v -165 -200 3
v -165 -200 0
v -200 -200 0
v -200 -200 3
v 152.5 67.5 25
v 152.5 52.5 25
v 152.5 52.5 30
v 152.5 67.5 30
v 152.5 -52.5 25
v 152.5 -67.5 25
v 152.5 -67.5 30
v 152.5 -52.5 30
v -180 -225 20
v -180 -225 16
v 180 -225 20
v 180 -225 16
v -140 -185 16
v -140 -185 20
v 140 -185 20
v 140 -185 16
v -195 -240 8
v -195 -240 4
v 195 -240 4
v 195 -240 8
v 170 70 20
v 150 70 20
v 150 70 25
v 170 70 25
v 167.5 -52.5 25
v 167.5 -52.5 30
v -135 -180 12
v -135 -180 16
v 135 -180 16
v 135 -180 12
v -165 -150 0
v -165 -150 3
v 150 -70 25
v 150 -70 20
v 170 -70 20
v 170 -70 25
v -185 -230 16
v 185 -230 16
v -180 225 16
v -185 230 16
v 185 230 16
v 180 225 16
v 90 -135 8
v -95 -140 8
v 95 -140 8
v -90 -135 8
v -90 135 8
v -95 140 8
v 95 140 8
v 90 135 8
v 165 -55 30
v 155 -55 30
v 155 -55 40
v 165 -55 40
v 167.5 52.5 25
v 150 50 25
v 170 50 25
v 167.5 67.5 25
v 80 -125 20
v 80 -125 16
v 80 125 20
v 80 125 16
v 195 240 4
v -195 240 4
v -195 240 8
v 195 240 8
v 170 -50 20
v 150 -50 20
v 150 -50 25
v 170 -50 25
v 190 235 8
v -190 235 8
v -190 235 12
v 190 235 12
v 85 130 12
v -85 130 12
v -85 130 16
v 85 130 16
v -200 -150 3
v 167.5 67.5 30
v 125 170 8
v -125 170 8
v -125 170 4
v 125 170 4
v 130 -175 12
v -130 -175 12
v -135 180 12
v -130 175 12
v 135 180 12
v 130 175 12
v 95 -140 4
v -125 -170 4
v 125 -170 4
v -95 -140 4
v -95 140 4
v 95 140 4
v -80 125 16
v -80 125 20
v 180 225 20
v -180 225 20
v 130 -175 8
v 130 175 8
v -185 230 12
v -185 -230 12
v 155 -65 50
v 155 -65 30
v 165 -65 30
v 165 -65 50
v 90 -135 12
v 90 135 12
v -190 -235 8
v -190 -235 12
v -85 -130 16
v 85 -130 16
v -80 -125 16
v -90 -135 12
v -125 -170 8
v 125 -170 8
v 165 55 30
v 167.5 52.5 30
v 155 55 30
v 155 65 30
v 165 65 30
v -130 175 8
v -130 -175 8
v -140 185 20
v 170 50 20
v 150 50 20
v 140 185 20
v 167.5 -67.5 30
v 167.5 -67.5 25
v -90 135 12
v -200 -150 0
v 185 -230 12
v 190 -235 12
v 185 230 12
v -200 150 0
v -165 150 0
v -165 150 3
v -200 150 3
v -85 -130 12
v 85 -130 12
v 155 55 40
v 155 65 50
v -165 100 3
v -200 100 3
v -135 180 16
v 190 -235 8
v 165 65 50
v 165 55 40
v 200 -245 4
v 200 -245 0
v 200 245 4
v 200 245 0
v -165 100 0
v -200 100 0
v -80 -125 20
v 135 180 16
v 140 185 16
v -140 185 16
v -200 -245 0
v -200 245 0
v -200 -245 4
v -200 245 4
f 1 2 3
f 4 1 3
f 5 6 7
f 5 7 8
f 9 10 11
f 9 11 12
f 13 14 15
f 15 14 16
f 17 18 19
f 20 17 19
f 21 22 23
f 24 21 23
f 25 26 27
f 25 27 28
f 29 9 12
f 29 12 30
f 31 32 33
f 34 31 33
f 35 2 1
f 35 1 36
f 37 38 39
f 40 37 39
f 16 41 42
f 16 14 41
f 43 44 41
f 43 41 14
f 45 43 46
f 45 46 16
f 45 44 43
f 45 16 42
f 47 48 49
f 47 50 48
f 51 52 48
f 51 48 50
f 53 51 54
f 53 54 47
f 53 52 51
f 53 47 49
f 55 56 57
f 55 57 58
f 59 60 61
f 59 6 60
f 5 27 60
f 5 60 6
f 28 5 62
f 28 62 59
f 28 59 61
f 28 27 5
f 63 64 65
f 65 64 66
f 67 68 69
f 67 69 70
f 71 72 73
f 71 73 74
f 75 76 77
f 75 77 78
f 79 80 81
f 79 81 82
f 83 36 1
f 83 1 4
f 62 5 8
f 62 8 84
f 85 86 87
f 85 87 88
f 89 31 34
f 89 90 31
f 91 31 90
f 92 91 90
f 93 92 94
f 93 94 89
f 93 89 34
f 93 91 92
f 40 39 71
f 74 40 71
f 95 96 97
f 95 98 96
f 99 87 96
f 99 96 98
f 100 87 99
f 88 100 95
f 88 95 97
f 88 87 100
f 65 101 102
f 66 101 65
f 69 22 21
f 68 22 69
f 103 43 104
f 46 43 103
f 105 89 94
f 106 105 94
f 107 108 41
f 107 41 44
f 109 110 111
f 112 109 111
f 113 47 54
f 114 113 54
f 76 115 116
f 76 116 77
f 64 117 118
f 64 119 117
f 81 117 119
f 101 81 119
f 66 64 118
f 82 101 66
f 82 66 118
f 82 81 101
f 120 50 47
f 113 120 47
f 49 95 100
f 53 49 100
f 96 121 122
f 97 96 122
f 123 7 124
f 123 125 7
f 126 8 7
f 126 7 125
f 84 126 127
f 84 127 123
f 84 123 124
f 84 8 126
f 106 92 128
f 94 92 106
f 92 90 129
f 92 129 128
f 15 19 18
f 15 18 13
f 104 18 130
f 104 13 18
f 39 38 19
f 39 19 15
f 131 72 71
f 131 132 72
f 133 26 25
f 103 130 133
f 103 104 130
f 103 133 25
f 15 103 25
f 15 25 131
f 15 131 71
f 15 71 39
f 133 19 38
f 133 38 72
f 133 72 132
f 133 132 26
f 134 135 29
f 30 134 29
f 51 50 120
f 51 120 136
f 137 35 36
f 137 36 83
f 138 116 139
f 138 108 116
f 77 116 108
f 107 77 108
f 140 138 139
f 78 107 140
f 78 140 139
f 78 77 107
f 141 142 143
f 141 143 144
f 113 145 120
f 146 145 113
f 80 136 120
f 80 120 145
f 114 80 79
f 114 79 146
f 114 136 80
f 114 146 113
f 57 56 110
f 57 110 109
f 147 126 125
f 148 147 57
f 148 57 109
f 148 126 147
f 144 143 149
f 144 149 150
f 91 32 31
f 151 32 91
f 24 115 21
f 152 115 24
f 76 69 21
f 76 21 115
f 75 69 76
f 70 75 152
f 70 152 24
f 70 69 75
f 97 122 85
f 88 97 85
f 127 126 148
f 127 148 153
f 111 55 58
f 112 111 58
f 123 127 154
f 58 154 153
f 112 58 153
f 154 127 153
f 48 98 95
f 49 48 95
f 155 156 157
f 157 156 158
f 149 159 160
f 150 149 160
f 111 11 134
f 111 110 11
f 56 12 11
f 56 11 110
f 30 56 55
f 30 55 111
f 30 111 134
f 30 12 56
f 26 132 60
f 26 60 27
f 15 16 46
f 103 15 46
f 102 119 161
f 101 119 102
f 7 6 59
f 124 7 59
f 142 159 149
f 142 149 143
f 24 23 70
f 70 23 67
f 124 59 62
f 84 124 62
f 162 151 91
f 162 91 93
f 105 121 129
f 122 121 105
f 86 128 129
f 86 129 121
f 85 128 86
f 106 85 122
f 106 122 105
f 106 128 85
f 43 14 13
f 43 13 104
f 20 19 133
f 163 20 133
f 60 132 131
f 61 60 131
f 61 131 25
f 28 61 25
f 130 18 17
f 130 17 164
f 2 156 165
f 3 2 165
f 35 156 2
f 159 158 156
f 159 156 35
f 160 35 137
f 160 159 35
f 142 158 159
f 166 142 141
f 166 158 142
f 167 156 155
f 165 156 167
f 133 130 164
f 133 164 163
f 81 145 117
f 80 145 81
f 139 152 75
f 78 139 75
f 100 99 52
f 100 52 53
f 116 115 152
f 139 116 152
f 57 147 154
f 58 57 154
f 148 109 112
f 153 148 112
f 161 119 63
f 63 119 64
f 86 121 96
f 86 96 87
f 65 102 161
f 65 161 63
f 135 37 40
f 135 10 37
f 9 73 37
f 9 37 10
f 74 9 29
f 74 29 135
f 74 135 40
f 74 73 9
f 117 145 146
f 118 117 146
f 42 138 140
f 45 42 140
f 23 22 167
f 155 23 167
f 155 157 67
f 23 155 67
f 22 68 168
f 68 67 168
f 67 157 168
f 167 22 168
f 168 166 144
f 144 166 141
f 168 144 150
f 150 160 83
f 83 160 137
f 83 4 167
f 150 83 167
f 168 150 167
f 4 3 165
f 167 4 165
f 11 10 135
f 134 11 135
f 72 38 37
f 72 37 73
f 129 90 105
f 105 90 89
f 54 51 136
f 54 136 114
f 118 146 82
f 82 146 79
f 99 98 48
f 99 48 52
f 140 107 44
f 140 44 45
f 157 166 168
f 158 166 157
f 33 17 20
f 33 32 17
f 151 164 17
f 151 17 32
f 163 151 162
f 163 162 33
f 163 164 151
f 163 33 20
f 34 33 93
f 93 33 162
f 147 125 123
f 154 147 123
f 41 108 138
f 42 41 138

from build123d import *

# Parameters (mm, degrees)
BOSS_EXTRUDE2_DEPTH  = 4
SKETCH2_W            = 390
SKETCH2_H            = 480
BOSS_EXTRUDE3_DEPTH  = 4
SKETCH3_W            = 380
SKETCH3_H            = 470
BOSS_EXTRUDE4_DEPTH  = 4
SKETCH4_W            = 370
SKETCH4_H            = 460
BOSS_EXTRUDE5_DEPTH  = 4
SKETCH5_W            = 360
SKETCH5_H            = 450
BOSS_EXTRUDE6_DEPTH  = 4
SKETCH6_W            = 280
SKETCH6_H            = 370
CUT_EXTRUDE1_DEPTH   = 4
SKETCH7_W            = 270
SKETCH7_H            = 360
CUT_EXTRUDE2_DEPTH   = 4
SKETCH8_W            = 260
SKETCH8_H            = 350
CUT_EXTRUDE3_DEPTH   = 4
SKETCH9_W            = 250
SKETCH9_H            = 340
CUT_EXTRUDE4_DEPTH   = 4
SKETCH11_W           = 190
SKETCH11_H           = 280
BOSS_EXTRUDE7_DEPTH  = 4
SKETCH12_W           = 180
SKETCH12_H           = 270
BOSS_EXTRUDE8_DEPTH  = 4
SKETCH13_W           = 170
SKETCH13_H           = 260
BOSS_EXTRUDE9_DEPTH  = 4
SKETCH14_W           = 160
SKETCH14_H           = 250
BOSS_EXTRUDE10_DEPTH = 4
SKETCH15_W           = 20
SKETCH15_H           = 20
BOSS_EXTRUDE11_DEPTH = 5
SKETCH16_W           = 15
SKETCH16_H           = 15
BOSS_EXTRUDE12_DEPTH = 5
SKETCH17_W           = 10
SKETCH17_H           = 10
BOSS_EXTRUDE13_DEPTH = 20
BOSS_EXTRUDE14_REACH = 302
SKETCH18_W           = 10
SKETCH18_H           = 10
SKETCH19_W           = 35
SKETCH19_H           = 50
CUT_EXTRUDE5_DEPTH   = 3


with BuildPart() as part:
    # Sketch1 → Boss-Extrude2 (new body)
    with BuildSketch(Plane.XY):
        Polygon((200, 0), (200, -20), (200, -245), (-200, -245), (-200, -20), (-200, 0), (-200, 245), (200, 245), align=None)
    extrude(amount=BOSS_EXTRUDE2_DEPTH)

    # Sketch2 → Boss-Extrude3 (add)
    with BuildSketch(Plane.XY.offset(4)):
        Rectangle(SKETCH2_W, SKETCH2_H)
    extrude(amount=BOSS_EXTRUDE3_DEPTH)

    # Sketch3 → Boss-Extrude4 (add)
    with BuildSketch(Plane.XY.offset(8)):
        Rectangle(SKETCH3_W, SKETCH3_H)
    extrude(amount=BOSS_EXTRUDE4_DEPTH)

    # Sketch4 → Boss-Extrude5 (add)
    with BuildSketch(Plane.XY.offset(12)):
        Rectangle(SKETCH4_W, SKETCH4_H)
    extrude(amount=BOSS_EXTRUDE5_DEPTH)

    # Sketch5 → Boss-Extrude6 (add)
    with BuildSketch(Plane.XY.offset(16)):
        Rectangle(SKETCH5_W, SKETCH5_H)
    extrude(amount=BOSS_EXTRUDE6_DEPTH)

    # Sketch6 → Cut-Extrude1 (cut)
    with BuildSketch(Plane.XY.offset(20)):
        Rectangle(SKETCH6_W, SKETCH6_H)
    extrude(amount=-CUT_EXTRUDE1_DEPTH, mode=Mode.SUBTRACT)

    # Sketch7 → Cut-Extrude2 (cut)
    with BuildSketch(Plane.XY.offset(16)):
        Rectangle(SKETCH7_W, SKETCH7_H)
    extrude(amount=-CUT_EXTRUDE2_DEPTH, mode=Mode.SUBTRACT)

    # Sketch8 → Cut-Extrude3 (cut)
    with BuildSketch(Plane.XY.offset(12)):
        Rectangle(SKETCH8_W, SKETCH8_H)
    extrude(amount=-CUT_EXTRUDE3_DEPTH, mode=Mode.SUBTRACT)

    # Sketch9 → Cut-Extrude4 (cut)
    with BuildSketch(Plane.XY.offset(8)):
        Rectangle(SKETCH9_W, SKETCH9_H)
    extrude(amount=-CUT_EXTRUDE4_DEPTH, mode=Mode.SUBTRACT)

    # Sketch11 → Boss-Extrude7 (add)
    with BuildSketch(Plane.XY.offset(4)):
        Rectangle(SKETCH11_W, SKETCH11_H)
    extrude(amount=BOSS_EXTRUDE7_DEPTH)

    # Sketch12 → Boss-Extrude8 (add)
    with BuildSketch(Plane.XY.offset(8)):
        Rectangle(SKETCH12_W, SKETCH12_H)
    extrude(amount=BOSS_EXTRUDE8_DEPTH)

    # Sketch13 → Boss-Extrude9 (add)
    with BuildSketch(Plane.XY.offset(12)):
        Rectangle(SKETCH13_W, SKETCH13_H)
    extrude(amount=BOSS_EXTRUDE9_DEPTH)

    # Sketch14 → Boss-Extrude10 (add)
    with BuildSketch(Plane.XY.offset(16)):
        Rectangle(SKETCH14_W, SKETCH14_H)
    extrude(amount=BOSS_EXTRUDE10_DEPTH)

    # Sketch15 → Boss-Extrude11 (add)
    with BuildSketch(Plane.XY.offset(20)):
        with Locations((160, 60)):
            Rectangle(SKETCH15_W, SKETCH15_H)
        with Locations((160, -60)):
            Rectangle(SKETCH15_W, SKETCH15_H)
    extrude(amount=BOSS_EXTRUDE11_DEPTH)

    # Sketch16 → Boss-Extrude12 (add)
    with BuildSketch(Plane.XY.offset(25)):
        with Locations((160, 60)):
            Rectangle(SKETCH16_W, SKETCH16_H)
        with Locations((160, -60)):
            Rectangle(SKETCH16_W, SKETCH16_H)
    extrude(amount=BOSS_EXTRUDE12_DEPTH)

    # Sketch17 → Boss-Extrude13 (add)
    with BuildSketch(Plane.XY.offset(30)):
        with Locations((160, 60)):
            Rectangle(SKETCH17_W, SKETCH17_H)
        with Locations((160, -60)):
            Rectangle(SKETCH17_W, SKETCH17_H)
    extrude(amount=BOSS_EXTRUDE13_DEPTH)

    # Sketch18 → Boss-Extrude14 (add, up to next)
    with BuildSketch(Plane.XZ.offset(-55), mode=Mode.PRIVATE) as boss_extrude14_sk1:
        with Locations((160, 45)):
            Rectangle(SKETCH18_W, SKETCH18_H)
    boss_extrude14_tool1 = extrude(boss_extrude14_sk1.sketch, amount=BOSS_EXTRUDE14_REACH, mode=Mode.PRIVATE) - part.part
    add(boss_extrude14_tool1.solids().sort_by_distance((160, 55, 45))[0])

    # Sketch19 → Cut-Extrude5 (cut)
    with BuildSketch(Plane(origin=(0, 0, 0), x_dir=(-1, 0, 0), z_dir=(0, 0, -1))):
        with Locations((182.5, 125)):
            Rectangle(SKETCH19_W, SKETCH19_H)
        with Locations((182.5, -175)):
            Rectangle(SKETCH19_W, SKETCH19_H)
    extrude(amount=-CUT_EXTRUDE5_DEPTH, mode=Mode.SUBTRACT)


solid = part.part
